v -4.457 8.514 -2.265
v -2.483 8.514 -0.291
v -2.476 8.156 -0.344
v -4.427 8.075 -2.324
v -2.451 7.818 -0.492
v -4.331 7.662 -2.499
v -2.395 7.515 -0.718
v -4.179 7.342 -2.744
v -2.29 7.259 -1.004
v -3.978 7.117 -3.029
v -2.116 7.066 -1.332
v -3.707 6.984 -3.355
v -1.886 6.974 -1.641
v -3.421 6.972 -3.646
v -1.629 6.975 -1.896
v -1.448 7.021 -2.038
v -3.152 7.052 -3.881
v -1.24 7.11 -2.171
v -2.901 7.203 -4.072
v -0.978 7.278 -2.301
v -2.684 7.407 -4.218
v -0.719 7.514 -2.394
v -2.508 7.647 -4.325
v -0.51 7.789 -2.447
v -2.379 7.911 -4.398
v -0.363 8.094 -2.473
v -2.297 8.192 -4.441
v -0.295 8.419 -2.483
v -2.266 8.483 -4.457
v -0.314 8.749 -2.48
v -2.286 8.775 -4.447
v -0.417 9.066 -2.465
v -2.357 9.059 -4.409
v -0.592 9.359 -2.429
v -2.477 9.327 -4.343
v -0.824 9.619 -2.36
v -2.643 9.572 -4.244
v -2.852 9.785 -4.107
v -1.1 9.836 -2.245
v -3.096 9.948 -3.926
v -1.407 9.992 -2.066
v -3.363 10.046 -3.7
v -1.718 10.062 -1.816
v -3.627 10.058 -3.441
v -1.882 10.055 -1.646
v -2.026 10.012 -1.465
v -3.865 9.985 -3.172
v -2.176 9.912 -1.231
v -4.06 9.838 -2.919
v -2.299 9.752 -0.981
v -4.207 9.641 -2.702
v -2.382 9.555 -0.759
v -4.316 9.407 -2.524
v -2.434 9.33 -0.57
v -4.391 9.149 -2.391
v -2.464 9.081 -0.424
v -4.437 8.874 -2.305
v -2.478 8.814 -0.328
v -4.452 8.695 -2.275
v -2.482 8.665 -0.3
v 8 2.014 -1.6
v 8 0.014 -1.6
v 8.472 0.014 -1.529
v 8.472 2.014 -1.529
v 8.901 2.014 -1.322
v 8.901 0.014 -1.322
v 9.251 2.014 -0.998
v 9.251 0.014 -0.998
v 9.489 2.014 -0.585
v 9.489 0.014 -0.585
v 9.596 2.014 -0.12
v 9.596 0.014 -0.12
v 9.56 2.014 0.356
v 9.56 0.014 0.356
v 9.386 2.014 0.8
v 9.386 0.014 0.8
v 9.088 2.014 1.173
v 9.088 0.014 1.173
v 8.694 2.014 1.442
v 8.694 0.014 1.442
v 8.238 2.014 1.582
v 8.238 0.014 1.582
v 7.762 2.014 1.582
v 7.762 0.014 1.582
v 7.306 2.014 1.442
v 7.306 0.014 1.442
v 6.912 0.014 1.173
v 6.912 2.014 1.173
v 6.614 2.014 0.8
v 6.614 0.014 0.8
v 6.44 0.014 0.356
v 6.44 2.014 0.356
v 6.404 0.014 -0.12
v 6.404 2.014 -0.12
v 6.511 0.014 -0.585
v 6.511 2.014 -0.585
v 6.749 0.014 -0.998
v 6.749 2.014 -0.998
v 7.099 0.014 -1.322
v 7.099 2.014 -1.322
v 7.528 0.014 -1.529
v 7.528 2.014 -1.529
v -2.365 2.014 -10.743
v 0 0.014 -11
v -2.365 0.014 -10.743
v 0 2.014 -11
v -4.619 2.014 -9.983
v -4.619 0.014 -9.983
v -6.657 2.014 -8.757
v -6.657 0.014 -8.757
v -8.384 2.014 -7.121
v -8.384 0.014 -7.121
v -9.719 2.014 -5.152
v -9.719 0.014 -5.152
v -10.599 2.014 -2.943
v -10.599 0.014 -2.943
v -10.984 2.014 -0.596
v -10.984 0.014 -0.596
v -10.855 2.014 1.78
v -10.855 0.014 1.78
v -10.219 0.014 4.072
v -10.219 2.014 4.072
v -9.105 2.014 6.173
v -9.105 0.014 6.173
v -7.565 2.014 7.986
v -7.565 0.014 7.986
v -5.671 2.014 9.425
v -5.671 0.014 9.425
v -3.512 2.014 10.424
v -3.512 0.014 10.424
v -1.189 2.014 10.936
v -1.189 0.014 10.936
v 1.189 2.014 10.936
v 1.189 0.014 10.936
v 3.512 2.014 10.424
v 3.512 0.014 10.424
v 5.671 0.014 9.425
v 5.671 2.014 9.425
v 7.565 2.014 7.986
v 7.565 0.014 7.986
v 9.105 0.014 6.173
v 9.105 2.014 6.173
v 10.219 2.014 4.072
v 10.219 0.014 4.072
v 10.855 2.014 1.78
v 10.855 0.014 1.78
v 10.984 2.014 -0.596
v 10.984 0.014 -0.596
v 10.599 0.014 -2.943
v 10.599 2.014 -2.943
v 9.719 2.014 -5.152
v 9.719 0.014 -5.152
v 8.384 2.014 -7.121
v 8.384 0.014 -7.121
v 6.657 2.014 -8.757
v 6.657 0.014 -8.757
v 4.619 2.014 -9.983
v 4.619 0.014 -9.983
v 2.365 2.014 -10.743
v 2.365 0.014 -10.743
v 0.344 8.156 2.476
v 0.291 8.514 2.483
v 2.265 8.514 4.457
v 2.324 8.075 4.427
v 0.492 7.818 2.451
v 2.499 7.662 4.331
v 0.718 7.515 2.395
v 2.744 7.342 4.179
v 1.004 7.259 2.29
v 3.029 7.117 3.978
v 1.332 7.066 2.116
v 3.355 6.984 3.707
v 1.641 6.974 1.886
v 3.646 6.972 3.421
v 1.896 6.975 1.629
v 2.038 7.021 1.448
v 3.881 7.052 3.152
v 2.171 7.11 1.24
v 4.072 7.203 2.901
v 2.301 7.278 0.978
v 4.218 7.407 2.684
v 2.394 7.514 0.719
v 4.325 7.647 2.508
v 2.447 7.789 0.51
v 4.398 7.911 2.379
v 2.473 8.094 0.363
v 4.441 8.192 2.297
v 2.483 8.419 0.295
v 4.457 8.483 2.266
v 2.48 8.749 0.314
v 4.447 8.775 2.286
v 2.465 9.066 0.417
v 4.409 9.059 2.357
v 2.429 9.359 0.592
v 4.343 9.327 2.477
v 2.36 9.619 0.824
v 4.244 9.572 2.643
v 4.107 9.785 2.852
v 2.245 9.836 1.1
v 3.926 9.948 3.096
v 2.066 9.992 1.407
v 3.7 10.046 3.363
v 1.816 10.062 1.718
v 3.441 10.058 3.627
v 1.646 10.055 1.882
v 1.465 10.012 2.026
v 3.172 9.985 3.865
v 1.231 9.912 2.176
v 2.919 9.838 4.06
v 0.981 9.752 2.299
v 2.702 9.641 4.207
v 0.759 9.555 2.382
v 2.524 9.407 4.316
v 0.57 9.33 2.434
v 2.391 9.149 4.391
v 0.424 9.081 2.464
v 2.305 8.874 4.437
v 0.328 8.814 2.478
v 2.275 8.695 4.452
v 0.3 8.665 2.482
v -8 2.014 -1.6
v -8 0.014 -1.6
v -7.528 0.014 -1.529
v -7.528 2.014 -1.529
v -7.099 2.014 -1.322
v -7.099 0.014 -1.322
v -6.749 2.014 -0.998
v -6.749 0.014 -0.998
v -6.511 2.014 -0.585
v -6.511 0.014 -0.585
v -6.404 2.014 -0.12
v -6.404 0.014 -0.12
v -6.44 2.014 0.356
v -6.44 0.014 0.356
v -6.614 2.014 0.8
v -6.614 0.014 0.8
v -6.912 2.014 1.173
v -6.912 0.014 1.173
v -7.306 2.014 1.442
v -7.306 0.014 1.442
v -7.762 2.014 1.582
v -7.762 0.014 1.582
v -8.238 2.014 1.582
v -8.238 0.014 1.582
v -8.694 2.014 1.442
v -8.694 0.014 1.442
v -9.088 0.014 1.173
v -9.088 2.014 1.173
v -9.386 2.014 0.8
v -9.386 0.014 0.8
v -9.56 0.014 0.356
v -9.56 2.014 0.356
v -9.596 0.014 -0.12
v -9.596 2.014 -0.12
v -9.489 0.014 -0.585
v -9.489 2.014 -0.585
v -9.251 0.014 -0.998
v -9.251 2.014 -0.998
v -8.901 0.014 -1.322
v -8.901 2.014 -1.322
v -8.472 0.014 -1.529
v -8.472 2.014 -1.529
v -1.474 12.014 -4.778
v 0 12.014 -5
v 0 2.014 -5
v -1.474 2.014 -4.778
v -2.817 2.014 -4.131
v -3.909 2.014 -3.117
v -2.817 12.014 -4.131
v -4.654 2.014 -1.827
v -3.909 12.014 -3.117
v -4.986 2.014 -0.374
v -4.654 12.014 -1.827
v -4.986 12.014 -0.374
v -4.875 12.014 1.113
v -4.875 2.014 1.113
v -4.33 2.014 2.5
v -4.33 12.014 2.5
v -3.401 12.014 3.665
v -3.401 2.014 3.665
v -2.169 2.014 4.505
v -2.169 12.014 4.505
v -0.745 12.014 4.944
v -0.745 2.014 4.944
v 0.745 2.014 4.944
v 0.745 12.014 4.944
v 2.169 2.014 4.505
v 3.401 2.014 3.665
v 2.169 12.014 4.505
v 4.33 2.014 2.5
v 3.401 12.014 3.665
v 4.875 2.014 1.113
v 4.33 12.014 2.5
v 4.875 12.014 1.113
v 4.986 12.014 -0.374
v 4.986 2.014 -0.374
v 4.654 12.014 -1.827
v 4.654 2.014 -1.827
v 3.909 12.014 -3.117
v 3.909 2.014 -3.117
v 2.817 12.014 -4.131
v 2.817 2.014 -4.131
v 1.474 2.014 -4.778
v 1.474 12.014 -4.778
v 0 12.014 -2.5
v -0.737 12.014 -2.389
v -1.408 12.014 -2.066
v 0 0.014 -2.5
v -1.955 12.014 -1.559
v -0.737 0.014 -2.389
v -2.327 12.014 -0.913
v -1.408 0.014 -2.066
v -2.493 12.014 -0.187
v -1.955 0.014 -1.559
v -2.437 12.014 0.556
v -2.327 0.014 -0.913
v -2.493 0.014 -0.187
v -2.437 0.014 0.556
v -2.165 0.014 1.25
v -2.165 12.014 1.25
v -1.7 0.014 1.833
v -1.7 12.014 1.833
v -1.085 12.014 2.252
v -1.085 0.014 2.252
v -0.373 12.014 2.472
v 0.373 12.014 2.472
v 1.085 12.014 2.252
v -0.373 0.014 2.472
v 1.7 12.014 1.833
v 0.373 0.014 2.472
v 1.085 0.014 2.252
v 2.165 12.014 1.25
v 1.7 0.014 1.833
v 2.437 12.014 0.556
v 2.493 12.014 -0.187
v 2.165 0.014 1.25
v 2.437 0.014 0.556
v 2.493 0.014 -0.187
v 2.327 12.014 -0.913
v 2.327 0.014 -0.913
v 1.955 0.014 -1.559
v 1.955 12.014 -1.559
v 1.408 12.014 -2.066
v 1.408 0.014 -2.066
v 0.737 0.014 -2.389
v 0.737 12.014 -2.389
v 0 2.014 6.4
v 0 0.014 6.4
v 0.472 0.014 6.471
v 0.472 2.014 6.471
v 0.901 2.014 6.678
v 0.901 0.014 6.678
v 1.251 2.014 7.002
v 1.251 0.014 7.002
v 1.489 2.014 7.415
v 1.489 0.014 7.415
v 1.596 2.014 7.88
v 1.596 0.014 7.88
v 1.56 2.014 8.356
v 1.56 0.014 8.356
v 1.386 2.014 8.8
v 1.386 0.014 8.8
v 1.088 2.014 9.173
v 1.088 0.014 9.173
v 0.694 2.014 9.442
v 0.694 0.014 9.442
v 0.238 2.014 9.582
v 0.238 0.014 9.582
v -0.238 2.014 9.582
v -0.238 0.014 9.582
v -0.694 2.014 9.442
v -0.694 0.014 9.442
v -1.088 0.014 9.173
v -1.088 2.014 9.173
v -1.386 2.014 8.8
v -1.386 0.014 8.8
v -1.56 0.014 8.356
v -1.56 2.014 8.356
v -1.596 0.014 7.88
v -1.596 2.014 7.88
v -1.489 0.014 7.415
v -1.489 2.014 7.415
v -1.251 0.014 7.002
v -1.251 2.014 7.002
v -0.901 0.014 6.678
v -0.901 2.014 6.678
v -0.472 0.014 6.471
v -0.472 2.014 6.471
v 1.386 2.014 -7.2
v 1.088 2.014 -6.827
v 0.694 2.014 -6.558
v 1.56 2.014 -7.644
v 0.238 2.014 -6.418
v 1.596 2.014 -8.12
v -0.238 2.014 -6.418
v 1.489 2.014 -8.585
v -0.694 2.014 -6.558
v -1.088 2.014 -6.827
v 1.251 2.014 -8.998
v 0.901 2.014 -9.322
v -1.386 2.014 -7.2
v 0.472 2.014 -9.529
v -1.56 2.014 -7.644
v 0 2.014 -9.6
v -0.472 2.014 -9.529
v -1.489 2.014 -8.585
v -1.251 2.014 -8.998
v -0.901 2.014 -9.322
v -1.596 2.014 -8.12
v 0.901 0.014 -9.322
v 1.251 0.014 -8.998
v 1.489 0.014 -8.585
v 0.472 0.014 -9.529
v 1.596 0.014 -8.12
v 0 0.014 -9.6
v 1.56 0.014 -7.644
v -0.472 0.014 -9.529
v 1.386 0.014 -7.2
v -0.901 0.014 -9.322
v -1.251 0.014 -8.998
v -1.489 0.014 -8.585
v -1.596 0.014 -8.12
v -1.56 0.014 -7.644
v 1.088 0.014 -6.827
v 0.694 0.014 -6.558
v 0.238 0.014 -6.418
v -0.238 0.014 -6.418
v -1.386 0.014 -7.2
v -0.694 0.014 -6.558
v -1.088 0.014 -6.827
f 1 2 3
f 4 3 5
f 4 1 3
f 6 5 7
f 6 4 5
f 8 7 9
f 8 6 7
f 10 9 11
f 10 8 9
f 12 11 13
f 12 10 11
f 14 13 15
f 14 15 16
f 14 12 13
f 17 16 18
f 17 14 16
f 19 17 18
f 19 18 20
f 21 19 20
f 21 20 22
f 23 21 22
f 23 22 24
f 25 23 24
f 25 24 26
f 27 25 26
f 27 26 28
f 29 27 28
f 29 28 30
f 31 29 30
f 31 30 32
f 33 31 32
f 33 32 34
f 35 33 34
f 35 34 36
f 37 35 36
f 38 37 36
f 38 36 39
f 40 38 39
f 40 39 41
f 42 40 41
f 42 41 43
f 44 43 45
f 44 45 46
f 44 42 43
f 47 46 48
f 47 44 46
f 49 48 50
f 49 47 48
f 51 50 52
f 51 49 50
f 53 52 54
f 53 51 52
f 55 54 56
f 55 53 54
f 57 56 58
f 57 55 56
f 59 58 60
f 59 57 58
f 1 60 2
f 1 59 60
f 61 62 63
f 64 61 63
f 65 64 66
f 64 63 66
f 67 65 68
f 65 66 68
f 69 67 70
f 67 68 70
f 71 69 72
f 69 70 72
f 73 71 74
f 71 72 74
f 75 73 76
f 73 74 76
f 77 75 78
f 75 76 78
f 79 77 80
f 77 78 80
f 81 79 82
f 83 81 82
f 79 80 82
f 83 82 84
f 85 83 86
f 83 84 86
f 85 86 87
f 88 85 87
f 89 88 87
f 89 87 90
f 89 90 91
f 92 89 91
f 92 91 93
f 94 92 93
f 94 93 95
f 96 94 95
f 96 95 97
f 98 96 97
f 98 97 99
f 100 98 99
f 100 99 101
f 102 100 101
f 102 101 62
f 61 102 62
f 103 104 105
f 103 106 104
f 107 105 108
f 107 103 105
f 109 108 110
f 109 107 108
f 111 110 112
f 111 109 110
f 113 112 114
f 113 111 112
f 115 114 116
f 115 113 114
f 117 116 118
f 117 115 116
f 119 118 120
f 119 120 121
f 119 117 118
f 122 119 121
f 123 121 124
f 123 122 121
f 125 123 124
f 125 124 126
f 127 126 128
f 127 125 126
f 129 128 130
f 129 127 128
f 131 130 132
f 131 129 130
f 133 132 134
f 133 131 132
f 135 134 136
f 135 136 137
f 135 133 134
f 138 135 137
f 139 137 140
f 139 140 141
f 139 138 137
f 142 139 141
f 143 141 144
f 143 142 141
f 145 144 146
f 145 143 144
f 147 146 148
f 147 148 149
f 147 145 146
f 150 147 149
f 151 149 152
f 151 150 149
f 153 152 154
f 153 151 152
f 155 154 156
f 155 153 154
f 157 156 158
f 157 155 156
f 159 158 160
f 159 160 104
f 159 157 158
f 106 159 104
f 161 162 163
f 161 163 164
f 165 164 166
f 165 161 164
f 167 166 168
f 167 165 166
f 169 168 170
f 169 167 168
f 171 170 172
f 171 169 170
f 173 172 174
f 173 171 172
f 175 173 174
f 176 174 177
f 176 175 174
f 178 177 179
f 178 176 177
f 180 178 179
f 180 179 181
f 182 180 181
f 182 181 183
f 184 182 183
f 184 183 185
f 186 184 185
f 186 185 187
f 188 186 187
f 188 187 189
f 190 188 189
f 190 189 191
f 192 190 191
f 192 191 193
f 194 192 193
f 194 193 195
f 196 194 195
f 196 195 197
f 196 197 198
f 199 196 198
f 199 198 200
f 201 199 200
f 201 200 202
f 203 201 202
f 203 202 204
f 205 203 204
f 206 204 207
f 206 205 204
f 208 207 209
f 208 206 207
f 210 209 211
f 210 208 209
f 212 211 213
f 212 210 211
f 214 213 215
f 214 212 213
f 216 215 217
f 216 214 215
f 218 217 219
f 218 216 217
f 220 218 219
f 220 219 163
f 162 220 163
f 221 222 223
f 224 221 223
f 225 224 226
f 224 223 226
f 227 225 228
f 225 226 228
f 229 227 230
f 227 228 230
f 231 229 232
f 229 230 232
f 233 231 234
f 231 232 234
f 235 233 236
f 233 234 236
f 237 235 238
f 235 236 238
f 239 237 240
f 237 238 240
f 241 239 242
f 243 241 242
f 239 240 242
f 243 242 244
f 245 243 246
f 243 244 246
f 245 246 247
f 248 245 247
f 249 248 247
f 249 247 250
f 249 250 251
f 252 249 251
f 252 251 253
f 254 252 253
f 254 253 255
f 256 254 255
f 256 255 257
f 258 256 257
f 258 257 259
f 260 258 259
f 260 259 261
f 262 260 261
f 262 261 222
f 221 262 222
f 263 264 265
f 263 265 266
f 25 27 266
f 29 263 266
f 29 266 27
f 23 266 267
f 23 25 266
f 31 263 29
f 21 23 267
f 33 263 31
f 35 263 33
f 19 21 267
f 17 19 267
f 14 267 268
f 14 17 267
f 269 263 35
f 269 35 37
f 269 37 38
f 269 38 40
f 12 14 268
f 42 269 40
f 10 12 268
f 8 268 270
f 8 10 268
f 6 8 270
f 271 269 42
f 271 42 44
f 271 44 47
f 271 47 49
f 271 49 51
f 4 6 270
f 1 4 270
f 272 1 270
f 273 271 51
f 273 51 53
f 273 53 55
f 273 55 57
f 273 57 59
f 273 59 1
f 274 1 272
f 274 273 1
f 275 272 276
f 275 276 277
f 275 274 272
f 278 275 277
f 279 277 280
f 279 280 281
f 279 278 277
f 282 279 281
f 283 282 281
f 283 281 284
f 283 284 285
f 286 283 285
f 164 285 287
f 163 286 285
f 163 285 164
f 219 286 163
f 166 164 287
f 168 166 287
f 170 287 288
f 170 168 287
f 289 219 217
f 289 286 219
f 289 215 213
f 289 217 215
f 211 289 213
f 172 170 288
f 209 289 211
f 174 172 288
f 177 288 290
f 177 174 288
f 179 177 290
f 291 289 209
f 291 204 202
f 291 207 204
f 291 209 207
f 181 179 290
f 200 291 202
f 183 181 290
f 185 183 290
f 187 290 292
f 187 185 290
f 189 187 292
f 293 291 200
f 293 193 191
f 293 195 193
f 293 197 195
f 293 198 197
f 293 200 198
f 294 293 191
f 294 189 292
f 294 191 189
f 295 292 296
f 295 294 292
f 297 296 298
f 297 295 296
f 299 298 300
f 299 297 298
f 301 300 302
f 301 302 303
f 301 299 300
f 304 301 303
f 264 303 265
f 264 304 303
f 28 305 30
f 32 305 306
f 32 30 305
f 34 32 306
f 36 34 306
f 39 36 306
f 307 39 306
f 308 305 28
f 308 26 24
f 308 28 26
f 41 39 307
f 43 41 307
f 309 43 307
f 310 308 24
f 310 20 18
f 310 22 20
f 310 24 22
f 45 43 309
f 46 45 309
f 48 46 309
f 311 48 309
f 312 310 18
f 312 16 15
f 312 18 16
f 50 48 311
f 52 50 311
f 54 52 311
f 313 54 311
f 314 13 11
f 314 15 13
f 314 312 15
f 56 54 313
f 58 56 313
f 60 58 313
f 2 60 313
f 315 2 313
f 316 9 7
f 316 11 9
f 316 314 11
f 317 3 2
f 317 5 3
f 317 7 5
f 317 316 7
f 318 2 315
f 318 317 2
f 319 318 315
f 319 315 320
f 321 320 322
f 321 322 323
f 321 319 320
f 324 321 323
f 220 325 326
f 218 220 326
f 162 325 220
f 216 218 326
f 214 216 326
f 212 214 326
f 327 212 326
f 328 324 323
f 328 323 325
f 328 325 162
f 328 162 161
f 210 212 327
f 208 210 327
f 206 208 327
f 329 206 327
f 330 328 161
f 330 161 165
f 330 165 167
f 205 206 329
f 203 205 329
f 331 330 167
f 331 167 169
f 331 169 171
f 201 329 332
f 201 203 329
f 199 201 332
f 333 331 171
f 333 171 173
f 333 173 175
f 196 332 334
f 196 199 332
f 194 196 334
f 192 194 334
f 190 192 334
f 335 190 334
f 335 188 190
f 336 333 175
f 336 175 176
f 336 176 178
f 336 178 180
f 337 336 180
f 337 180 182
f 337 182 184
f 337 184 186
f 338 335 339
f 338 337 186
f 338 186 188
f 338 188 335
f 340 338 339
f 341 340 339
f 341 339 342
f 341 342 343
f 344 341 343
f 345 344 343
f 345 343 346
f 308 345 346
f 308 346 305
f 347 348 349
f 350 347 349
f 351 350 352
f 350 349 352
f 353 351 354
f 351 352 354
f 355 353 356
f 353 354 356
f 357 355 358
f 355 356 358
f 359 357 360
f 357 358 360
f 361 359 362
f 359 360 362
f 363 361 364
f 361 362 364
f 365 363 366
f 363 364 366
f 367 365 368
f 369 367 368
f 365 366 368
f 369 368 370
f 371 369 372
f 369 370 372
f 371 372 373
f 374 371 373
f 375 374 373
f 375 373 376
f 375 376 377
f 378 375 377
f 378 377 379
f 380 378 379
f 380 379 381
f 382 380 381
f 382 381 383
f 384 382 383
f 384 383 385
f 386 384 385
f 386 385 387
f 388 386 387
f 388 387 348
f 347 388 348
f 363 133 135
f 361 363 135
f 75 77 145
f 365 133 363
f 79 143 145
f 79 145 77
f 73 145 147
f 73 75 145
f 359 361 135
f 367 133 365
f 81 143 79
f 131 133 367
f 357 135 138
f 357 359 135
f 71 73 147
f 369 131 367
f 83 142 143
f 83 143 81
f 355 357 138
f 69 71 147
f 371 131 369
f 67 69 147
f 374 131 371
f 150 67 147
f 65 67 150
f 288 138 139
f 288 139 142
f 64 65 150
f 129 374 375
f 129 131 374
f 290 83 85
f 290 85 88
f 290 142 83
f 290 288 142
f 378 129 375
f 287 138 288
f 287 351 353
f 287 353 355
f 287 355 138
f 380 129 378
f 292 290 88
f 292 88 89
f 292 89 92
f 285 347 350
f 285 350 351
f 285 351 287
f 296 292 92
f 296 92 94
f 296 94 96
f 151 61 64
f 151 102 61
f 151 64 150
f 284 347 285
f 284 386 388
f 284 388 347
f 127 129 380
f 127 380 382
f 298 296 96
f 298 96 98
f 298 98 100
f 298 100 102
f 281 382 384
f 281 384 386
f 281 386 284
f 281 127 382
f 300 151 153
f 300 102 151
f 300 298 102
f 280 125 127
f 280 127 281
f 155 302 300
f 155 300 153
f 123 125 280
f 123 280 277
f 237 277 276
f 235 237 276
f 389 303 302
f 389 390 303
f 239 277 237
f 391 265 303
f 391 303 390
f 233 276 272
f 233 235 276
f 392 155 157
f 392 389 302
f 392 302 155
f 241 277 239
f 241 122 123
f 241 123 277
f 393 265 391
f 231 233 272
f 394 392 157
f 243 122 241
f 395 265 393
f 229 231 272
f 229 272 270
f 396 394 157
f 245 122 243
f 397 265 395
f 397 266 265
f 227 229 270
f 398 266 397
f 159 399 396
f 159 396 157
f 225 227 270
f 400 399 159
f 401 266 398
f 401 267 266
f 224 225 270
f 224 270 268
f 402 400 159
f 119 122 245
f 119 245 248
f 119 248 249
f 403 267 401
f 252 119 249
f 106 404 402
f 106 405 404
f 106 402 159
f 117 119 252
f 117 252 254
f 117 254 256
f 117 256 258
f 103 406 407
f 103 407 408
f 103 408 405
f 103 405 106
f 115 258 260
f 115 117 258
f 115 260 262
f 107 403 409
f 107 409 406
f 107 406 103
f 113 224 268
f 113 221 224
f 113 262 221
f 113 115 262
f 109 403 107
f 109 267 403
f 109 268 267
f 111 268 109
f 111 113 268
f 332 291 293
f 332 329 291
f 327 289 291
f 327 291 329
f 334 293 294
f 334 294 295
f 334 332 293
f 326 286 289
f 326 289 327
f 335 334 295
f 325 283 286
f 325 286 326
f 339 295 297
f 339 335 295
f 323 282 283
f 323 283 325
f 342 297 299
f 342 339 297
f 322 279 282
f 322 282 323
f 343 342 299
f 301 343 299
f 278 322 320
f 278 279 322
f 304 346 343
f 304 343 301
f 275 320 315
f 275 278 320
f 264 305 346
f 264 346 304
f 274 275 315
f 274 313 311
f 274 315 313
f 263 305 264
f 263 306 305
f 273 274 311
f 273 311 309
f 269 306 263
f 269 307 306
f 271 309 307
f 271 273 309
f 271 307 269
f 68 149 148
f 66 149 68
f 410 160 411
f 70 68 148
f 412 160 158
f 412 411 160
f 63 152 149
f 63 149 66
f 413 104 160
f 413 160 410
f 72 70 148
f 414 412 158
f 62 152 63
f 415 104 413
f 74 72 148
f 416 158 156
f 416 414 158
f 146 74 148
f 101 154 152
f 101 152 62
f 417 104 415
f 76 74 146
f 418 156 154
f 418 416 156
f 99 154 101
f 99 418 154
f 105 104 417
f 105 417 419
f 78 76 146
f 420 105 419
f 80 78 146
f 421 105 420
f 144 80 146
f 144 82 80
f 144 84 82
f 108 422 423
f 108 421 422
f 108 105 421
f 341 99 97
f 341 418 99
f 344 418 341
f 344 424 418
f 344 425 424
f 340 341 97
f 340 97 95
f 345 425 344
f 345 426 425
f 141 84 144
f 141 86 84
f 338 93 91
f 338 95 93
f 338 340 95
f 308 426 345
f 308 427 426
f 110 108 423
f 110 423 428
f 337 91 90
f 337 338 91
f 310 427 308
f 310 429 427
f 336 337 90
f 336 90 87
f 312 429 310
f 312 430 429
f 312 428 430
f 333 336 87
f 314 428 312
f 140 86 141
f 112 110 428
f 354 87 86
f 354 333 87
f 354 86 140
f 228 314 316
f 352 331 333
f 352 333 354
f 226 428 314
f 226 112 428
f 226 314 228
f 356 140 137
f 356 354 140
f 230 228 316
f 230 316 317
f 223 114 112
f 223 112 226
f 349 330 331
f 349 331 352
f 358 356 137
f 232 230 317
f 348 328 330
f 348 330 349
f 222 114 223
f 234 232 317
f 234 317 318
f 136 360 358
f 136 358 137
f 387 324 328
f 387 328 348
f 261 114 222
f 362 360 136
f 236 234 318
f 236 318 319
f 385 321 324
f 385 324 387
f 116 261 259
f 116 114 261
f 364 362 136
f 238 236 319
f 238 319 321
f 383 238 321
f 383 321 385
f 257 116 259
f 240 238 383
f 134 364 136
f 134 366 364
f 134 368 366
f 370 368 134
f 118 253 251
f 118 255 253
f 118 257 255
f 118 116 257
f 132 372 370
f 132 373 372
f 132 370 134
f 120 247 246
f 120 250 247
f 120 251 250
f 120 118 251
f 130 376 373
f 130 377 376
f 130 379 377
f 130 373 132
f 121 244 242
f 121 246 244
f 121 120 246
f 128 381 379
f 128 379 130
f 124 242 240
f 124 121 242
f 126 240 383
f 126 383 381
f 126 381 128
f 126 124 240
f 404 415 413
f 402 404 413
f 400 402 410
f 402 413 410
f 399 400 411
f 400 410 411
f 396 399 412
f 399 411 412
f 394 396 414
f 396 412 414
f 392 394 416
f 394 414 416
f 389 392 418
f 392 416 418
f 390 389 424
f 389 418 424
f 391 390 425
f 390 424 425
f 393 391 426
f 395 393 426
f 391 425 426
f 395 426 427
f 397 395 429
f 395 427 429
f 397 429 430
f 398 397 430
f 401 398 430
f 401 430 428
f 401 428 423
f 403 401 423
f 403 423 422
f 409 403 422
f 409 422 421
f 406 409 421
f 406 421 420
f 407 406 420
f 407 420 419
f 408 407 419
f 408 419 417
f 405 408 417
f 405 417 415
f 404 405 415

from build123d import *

# Parameters (mm, degrees)
SKETCH_2_R               = 1.6
CUT_EXTRUDE_1_DEPTH      = 10
CUT_EXTRUDE_2_DEPTH      = 10
CUT_EXTRUDE_2_DEPTH_BACK = 10
SKETCH_3_R               = 1.55


with BuildPart() as part:
    # 草图1 → 旋转1 (revolve)
    with BuildSketch(Plane.XY):
        Polygon((-2.5, 0.013967073), (-11, 0.013967073), (-11, 2.013967073), (-5, 2.013967073), (-5, 12.013967073), (-2.5, 12.013967073), align=None)
    revolve(axis=Axis((0, 0, 0), (0, 1, 0)))

    # 草图2 → 切除-拉伸1 (cut)
    with BuildSketch(Plane.XZ.offset(-0.013967073)):
        with Locations((-8, 0)):
            Circle(SKETCH_2_R)
        with Locations((0, 8)):
            Circle(SKETCH_2_R)
        with Locations((8, 0)):
            Circle(SKETCH_2_R)
        with Locations((0, -8)):
            Circle(SKETCH_2_R)
    extrude(amount=-CUT_EXTRUDE_1_DEPTH, mode=Mode.SUBTRACT)

    # 草图3 → 切除-拉伸2 (cut, two sides: drawn at the far end of the back side and taken through both)
    with BuildSketch(Plane(origin=(0, 0, 0), x_dir=(0, -1, 0), z_dir=(0.7071067811865464, 0, 0.7071067811865488)).offset(-CUT_EXTRUDE_2_DEPTH_BACK)):
        with Locations((-8.513967073, 0)):
            Circle(SKETCH_3_R)
    extrude(amount=CUT_EXTRUDE_2_DEPTH + CUT_EXTRUDE_2_DEPTH_BACK, mode=Mode.SUBTRACT)


solid = part.part
